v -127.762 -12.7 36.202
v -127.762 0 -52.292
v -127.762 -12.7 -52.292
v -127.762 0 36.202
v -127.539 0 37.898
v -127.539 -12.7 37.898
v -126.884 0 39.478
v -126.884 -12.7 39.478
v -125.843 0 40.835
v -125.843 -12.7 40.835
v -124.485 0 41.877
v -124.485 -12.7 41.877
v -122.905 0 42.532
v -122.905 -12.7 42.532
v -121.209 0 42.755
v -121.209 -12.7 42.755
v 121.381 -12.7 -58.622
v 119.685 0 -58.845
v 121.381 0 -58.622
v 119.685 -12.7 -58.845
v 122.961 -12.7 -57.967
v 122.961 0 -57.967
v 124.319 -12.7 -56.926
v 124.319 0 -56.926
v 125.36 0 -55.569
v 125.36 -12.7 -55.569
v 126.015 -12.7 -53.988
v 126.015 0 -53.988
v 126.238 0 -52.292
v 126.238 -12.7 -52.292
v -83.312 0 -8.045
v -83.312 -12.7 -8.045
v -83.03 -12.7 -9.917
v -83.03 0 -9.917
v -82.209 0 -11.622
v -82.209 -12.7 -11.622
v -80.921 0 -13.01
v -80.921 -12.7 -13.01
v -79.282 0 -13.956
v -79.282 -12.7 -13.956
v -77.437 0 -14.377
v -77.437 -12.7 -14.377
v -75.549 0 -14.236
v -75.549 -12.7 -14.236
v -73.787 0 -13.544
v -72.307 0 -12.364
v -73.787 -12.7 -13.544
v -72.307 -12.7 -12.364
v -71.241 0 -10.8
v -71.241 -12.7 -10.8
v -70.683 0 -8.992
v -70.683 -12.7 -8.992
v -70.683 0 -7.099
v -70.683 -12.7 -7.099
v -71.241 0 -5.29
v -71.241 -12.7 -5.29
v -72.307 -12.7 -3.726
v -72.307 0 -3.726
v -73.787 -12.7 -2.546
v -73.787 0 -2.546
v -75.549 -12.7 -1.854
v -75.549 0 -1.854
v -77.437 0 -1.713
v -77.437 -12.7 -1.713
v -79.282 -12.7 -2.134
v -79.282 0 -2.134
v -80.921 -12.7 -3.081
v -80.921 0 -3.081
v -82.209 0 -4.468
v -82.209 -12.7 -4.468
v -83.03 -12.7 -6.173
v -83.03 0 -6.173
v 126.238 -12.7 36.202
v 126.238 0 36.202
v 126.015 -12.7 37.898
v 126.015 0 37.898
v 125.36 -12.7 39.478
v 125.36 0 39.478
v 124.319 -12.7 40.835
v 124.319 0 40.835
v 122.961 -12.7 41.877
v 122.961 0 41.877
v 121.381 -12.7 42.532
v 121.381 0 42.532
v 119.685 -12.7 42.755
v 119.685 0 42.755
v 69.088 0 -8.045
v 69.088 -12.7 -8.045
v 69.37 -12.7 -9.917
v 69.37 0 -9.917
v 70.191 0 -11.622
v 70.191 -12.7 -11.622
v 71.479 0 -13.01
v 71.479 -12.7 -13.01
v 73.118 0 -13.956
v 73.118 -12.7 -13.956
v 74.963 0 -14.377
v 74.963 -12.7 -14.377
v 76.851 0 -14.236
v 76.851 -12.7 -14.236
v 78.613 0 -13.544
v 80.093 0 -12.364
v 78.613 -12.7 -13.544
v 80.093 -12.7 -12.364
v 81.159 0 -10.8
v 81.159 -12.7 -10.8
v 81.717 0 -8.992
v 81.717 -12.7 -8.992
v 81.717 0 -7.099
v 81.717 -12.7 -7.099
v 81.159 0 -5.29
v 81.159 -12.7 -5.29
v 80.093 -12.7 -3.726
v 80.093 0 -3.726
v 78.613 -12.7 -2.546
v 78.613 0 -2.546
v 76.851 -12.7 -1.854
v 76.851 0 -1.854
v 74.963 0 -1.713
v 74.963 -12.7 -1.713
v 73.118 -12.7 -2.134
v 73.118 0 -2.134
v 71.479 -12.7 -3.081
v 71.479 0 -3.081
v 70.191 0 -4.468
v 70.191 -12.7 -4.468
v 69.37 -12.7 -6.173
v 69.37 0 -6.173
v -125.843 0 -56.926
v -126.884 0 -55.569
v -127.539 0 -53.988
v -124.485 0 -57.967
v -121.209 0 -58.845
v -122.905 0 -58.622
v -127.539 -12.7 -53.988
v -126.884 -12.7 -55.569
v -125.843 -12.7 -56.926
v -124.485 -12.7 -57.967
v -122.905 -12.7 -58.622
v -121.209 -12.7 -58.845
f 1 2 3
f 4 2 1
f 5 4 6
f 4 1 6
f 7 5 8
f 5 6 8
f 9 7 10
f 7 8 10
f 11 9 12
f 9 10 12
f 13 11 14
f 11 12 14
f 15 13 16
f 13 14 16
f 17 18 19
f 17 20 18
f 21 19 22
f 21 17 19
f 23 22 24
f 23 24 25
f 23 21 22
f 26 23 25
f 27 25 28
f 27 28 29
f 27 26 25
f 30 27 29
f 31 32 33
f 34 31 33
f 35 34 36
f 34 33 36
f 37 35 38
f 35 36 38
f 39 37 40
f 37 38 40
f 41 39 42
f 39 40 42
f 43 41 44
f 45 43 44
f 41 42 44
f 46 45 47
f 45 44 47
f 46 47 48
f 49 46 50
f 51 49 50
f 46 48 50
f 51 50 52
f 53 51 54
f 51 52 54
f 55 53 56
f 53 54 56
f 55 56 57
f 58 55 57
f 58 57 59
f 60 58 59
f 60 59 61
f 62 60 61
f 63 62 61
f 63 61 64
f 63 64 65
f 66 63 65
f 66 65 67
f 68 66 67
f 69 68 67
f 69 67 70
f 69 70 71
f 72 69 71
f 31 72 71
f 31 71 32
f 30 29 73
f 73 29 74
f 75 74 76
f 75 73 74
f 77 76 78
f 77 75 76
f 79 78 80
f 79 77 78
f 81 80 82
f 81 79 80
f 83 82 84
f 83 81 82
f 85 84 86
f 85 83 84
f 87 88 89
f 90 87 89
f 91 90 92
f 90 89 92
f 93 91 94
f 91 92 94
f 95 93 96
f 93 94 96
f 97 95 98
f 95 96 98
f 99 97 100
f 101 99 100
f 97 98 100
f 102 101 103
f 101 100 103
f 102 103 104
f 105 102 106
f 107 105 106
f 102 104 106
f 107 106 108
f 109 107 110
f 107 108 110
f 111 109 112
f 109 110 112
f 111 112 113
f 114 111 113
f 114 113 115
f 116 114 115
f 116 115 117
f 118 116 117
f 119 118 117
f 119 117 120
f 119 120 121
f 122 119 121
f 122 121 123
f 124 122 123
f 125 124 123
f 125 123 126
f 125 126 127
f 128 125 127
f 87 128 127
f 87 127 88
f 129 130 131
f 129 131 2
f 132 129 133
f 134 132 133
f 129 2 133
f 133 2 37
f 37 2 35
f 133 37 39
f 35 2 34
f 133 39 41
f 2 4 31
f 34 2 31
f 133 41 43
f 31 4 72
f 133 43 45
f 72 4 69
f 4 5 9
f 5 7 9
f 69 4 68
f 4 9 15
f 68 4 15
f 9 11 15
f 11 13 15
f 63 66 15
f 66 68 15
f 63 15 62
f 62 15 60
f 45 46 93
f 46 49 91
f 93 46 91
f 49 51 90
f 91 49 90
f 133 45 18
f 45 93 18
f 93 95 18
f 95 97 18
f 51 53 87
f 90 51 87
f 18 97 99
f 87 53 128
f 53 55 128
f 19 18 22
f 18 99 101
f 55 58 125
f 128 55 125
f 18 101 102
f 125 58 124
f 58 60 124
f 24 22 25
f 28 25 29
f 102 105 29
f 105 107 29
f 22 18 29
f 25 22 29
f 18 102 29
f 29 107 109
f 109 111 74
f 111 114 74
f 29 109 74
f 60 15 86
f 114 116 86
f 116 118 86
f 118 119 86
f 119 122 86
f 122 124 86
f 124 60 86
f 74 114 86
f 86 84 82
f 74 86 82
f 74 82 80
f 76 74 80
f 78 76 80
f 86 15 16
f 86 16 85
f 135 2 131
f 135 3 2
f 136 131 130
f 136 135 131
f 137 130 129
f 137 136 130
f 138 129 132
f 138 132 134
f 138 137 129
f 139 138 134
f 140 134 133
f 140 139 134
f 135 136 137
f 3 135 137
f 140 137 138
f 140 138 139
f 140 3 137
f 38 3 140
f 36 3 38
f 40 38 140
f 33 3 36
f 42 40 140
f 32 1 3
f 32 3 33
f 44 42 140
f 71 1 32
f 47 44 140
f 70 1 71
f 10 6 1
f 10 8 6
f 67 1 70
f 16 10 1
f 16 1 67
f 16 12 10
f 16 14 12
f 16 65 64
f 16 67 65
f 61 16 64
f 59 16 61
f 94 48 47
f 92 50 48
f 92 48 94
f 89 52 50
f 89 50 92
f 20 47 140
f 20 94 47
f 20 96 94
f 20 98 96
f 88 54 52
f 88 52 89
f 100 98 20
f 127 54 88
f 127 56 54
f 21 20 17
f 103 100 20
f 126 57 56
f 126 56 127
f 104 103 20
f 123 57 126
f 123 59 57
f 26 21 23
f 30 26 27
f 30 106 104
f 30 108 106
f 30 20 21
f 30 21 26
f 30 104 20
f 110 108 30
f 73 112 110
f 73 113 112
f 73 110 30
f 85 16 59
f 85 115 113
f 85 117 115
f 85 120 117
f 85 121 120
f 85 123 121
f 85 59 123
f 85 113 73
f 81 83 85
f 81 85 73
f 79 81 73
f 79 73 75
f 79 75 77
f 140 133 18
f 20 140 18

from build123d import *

# Parameters (mm, degrees)
F0_W     = 254
F0_H     = 101.6
F1_DEPTH = 12.7
F2_R     = 6.5532
F3_D     = 12.7


with BuildPart() as f1:
    # F0 (on Front) → F1 (new body)
    with BuildSketch(Plane.XZ):
        with Locations((-0.76200068, -8.045138209)):
            Rectangle(F0_W, F0_H)
    extrude(amount=F1_DEPTH)

    # F2
    f2_edges = [f1.edges().sort_by_distance(p)[0] for p in [
        (-127.762001, -6.35, 42.754862),
        (-127.762001, -6.35, -58.845138),
        (126.237999, -6.35, -58.845138),
        (126.237999, -6.35, 42.754862),
    ]]
    fillet(f2_edges, radius=F2_R)

    # F3 (through all)
    with Locations(Plane(origin=(0, 0, 0), x_dir=(1, 0, 0), z_dir=(0, 1, 0))):
        with Locations((-76.96200068, 8.045138209), (75.43799932, 8.045138209)):
            Hole(F3_D / 2)


solid = f1.part
